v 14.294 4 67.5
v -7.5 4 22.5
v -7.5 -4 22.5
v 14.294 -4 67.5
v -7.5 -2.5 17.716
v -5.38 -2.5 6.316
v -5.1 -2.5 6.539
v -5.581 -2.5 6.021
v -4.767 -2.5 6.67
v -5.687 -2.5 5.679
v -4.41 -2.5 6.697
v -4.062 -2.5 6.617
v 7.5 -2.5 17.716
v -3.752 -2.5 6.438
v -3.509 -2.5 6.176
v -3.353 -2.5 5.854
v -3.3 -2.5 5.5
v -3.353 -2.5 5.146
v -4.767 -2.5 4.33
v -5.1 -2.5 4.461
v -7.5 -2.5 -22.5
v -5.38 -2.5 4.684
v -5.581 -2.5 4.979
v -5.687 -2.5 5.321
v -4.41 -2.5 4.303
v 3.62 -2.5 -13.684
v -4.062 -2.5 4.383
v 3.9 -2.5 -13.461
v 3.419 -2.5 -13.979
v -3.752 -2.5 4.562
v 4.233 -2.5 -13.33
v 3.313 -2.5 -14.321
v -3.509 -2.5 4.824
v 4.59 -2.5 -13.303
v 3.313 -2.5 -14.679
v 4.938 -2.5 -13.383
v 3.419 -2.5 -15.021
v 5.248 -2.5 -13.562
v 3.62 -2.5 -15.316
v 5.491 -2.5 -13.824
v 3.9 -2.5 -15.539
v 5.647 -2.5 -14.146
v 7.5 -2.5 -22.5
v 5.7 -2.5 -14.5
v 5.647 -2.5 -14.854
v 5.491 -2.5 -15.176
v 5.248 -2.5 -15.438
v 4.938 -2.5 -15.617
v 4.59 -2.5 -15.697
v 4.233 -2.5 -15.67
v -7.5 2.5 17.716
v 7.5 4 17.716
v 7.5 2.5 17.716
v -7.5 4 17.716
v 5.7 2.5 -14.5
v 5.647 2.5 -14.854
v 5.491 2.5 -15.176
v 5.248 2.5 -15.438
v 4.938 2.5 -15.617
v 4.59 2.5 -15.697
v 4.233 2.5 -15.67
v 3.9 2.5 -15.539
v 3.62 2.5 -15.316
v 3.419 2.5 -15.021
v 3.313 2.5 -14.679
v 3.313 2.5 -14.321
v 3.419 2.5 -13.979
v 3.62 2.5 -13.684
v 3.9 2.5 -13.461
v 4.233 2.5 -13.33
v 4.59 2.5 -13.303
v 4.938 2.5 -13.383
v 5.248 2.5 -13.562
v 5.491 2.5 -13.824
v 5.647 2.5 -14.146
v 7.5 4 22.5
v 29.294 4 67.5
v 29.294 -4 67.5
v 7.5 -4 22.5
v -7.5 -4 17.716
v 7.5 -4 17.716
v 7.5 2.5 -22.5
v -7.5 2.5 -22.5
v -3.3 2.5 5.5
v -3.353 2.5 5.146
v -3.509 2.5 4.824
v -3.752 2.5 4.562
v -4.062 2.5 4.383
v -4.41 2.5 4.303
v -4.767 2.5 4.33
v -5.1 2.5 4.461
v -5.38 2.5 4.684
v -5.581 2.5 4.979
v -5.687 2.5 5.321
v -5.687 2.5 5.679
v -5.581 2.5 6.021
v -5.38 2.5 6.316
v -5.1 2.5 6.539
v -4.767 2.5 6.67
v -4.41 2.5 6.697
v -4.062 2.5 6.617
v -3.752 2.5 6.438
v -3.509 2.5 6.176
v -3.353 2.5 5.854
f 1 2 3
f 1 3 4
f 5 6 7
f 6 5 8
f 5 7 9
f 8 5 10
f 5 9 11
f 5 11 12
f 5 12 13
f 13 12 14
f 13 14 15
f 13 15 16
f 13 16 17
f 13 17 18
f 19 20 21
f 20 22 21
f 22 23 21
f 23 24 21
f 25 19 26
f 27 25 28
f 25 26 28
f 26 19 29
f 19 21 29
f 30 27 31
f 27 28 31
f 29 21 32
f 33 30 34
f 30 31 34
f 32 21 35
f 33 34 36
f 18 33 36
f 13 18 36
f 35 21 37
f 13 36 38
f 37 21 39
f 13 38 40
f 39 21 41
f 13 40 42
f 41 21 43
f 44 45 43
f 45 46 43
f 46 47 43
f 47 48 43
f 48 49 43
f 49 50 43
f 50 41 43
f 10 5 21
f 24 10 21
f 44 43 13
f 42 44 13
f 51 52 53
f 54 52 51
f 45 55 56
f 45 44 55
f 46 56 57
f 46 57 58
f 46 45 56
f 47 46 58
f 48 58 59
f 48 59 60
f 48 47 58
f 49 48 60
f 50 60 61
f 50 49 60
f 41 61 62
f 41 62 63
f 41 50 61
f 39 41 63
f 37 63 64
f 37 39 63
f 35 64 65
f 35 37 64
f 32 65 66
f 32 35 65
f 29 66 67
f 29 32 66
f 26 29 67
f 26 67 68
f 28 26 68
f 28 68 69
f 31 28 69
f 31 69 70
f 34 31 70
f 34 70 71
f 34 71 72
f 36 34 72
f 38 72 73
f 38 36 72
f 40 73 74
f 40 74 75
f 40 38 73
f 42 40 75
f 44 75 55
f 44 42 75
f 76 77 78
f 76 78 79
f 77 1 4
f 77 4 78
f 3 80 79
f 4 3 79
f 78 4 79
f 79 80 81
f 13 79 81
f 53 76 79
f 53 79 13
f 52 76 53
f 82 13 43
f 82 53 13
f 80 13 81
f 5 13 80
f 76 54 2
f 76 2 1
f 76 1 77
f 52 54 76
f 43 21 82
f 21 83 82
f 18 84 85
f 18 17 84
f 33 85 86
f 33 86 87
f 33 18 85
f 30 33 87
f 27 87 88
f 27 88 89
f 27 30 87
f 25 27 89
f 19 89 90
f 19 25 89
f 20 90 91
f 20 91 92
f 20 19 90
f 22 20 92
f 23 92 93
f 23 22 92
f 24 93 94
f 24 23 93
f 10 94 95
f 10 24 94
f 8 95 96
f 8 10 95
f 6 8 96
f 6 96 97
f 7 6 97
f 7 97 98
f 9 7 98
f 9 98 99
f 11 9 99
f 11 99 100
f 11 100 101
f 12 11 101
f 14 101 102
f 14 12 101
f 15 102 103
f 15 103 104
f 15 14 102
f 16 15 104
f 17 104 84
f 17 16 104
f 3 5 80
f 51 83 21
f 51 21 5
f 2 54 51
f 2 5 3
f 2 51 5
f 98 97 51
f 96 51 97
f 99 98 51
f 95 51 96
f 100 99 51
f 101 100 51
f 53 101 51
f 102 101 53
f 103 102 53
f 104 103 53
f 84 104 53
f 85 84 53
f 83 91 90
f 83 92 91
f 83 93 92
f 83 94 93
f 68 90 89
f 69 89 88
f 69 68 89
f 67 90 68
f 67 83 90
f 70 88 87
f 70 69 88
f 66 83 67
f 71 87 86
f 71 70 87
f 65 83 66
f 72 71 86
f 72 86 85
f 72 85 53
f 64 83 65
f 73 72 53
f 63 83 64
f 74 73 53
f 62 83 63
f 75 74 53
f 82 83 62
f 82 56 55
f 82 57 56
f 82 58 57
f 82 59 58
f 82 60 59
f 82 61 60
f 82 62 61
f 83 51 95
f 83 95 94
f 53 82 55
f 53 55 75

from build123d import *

# Parameters (mm, degrees)
SKETCH1_W           = 15
SKETCH1_H           = 45
SKETCH1_R           = 1.2
BOSS_EXTRUDE1_DEPTH = 2.5
BOSS_EXTRUDE2_DEPTH = 4


with BuildPart() as part:
    # Sketch1 → Boss-Extrude1 (new body, symmetric)
    with BuildSketch(Plane(origin=(0, 0, 0), x_dir=(1, 0, 0), z_dir=(0, 1, 0))):
        Rectangle(SKETCH1_W, SKETCH1_H)
        with Locations((-4.5, -5.5)):
            Circle(SKETCH1_R, mode=Mode.SUBTRACT)
        with Locations((4.5, 14.5)):
            Circle(SKETCH1_R, mode=Mode.SUBTRACT)
    extrude(amount=BOSS_EXTRUDE1_DEPTH, both=True)

    # Sketch4 → Boss-Extrude2 (add, symmetric)
    with BuildSketch(Plane(origin=(0, 0, 0), x_dir=(1, 0, 0), z_dir=(0, 1, 0))):
        Polygon((-7.5, -17.715662228), (-7.5, -22.5), (14.294494718, -67.5), (29.294494718, -67.5), (7.5, -22.5), (7.5, -17.715662228), align=None)
    extrude(amount=BOSS_EXTRUDE2_DEPTH, both=True)


solid = part.part
